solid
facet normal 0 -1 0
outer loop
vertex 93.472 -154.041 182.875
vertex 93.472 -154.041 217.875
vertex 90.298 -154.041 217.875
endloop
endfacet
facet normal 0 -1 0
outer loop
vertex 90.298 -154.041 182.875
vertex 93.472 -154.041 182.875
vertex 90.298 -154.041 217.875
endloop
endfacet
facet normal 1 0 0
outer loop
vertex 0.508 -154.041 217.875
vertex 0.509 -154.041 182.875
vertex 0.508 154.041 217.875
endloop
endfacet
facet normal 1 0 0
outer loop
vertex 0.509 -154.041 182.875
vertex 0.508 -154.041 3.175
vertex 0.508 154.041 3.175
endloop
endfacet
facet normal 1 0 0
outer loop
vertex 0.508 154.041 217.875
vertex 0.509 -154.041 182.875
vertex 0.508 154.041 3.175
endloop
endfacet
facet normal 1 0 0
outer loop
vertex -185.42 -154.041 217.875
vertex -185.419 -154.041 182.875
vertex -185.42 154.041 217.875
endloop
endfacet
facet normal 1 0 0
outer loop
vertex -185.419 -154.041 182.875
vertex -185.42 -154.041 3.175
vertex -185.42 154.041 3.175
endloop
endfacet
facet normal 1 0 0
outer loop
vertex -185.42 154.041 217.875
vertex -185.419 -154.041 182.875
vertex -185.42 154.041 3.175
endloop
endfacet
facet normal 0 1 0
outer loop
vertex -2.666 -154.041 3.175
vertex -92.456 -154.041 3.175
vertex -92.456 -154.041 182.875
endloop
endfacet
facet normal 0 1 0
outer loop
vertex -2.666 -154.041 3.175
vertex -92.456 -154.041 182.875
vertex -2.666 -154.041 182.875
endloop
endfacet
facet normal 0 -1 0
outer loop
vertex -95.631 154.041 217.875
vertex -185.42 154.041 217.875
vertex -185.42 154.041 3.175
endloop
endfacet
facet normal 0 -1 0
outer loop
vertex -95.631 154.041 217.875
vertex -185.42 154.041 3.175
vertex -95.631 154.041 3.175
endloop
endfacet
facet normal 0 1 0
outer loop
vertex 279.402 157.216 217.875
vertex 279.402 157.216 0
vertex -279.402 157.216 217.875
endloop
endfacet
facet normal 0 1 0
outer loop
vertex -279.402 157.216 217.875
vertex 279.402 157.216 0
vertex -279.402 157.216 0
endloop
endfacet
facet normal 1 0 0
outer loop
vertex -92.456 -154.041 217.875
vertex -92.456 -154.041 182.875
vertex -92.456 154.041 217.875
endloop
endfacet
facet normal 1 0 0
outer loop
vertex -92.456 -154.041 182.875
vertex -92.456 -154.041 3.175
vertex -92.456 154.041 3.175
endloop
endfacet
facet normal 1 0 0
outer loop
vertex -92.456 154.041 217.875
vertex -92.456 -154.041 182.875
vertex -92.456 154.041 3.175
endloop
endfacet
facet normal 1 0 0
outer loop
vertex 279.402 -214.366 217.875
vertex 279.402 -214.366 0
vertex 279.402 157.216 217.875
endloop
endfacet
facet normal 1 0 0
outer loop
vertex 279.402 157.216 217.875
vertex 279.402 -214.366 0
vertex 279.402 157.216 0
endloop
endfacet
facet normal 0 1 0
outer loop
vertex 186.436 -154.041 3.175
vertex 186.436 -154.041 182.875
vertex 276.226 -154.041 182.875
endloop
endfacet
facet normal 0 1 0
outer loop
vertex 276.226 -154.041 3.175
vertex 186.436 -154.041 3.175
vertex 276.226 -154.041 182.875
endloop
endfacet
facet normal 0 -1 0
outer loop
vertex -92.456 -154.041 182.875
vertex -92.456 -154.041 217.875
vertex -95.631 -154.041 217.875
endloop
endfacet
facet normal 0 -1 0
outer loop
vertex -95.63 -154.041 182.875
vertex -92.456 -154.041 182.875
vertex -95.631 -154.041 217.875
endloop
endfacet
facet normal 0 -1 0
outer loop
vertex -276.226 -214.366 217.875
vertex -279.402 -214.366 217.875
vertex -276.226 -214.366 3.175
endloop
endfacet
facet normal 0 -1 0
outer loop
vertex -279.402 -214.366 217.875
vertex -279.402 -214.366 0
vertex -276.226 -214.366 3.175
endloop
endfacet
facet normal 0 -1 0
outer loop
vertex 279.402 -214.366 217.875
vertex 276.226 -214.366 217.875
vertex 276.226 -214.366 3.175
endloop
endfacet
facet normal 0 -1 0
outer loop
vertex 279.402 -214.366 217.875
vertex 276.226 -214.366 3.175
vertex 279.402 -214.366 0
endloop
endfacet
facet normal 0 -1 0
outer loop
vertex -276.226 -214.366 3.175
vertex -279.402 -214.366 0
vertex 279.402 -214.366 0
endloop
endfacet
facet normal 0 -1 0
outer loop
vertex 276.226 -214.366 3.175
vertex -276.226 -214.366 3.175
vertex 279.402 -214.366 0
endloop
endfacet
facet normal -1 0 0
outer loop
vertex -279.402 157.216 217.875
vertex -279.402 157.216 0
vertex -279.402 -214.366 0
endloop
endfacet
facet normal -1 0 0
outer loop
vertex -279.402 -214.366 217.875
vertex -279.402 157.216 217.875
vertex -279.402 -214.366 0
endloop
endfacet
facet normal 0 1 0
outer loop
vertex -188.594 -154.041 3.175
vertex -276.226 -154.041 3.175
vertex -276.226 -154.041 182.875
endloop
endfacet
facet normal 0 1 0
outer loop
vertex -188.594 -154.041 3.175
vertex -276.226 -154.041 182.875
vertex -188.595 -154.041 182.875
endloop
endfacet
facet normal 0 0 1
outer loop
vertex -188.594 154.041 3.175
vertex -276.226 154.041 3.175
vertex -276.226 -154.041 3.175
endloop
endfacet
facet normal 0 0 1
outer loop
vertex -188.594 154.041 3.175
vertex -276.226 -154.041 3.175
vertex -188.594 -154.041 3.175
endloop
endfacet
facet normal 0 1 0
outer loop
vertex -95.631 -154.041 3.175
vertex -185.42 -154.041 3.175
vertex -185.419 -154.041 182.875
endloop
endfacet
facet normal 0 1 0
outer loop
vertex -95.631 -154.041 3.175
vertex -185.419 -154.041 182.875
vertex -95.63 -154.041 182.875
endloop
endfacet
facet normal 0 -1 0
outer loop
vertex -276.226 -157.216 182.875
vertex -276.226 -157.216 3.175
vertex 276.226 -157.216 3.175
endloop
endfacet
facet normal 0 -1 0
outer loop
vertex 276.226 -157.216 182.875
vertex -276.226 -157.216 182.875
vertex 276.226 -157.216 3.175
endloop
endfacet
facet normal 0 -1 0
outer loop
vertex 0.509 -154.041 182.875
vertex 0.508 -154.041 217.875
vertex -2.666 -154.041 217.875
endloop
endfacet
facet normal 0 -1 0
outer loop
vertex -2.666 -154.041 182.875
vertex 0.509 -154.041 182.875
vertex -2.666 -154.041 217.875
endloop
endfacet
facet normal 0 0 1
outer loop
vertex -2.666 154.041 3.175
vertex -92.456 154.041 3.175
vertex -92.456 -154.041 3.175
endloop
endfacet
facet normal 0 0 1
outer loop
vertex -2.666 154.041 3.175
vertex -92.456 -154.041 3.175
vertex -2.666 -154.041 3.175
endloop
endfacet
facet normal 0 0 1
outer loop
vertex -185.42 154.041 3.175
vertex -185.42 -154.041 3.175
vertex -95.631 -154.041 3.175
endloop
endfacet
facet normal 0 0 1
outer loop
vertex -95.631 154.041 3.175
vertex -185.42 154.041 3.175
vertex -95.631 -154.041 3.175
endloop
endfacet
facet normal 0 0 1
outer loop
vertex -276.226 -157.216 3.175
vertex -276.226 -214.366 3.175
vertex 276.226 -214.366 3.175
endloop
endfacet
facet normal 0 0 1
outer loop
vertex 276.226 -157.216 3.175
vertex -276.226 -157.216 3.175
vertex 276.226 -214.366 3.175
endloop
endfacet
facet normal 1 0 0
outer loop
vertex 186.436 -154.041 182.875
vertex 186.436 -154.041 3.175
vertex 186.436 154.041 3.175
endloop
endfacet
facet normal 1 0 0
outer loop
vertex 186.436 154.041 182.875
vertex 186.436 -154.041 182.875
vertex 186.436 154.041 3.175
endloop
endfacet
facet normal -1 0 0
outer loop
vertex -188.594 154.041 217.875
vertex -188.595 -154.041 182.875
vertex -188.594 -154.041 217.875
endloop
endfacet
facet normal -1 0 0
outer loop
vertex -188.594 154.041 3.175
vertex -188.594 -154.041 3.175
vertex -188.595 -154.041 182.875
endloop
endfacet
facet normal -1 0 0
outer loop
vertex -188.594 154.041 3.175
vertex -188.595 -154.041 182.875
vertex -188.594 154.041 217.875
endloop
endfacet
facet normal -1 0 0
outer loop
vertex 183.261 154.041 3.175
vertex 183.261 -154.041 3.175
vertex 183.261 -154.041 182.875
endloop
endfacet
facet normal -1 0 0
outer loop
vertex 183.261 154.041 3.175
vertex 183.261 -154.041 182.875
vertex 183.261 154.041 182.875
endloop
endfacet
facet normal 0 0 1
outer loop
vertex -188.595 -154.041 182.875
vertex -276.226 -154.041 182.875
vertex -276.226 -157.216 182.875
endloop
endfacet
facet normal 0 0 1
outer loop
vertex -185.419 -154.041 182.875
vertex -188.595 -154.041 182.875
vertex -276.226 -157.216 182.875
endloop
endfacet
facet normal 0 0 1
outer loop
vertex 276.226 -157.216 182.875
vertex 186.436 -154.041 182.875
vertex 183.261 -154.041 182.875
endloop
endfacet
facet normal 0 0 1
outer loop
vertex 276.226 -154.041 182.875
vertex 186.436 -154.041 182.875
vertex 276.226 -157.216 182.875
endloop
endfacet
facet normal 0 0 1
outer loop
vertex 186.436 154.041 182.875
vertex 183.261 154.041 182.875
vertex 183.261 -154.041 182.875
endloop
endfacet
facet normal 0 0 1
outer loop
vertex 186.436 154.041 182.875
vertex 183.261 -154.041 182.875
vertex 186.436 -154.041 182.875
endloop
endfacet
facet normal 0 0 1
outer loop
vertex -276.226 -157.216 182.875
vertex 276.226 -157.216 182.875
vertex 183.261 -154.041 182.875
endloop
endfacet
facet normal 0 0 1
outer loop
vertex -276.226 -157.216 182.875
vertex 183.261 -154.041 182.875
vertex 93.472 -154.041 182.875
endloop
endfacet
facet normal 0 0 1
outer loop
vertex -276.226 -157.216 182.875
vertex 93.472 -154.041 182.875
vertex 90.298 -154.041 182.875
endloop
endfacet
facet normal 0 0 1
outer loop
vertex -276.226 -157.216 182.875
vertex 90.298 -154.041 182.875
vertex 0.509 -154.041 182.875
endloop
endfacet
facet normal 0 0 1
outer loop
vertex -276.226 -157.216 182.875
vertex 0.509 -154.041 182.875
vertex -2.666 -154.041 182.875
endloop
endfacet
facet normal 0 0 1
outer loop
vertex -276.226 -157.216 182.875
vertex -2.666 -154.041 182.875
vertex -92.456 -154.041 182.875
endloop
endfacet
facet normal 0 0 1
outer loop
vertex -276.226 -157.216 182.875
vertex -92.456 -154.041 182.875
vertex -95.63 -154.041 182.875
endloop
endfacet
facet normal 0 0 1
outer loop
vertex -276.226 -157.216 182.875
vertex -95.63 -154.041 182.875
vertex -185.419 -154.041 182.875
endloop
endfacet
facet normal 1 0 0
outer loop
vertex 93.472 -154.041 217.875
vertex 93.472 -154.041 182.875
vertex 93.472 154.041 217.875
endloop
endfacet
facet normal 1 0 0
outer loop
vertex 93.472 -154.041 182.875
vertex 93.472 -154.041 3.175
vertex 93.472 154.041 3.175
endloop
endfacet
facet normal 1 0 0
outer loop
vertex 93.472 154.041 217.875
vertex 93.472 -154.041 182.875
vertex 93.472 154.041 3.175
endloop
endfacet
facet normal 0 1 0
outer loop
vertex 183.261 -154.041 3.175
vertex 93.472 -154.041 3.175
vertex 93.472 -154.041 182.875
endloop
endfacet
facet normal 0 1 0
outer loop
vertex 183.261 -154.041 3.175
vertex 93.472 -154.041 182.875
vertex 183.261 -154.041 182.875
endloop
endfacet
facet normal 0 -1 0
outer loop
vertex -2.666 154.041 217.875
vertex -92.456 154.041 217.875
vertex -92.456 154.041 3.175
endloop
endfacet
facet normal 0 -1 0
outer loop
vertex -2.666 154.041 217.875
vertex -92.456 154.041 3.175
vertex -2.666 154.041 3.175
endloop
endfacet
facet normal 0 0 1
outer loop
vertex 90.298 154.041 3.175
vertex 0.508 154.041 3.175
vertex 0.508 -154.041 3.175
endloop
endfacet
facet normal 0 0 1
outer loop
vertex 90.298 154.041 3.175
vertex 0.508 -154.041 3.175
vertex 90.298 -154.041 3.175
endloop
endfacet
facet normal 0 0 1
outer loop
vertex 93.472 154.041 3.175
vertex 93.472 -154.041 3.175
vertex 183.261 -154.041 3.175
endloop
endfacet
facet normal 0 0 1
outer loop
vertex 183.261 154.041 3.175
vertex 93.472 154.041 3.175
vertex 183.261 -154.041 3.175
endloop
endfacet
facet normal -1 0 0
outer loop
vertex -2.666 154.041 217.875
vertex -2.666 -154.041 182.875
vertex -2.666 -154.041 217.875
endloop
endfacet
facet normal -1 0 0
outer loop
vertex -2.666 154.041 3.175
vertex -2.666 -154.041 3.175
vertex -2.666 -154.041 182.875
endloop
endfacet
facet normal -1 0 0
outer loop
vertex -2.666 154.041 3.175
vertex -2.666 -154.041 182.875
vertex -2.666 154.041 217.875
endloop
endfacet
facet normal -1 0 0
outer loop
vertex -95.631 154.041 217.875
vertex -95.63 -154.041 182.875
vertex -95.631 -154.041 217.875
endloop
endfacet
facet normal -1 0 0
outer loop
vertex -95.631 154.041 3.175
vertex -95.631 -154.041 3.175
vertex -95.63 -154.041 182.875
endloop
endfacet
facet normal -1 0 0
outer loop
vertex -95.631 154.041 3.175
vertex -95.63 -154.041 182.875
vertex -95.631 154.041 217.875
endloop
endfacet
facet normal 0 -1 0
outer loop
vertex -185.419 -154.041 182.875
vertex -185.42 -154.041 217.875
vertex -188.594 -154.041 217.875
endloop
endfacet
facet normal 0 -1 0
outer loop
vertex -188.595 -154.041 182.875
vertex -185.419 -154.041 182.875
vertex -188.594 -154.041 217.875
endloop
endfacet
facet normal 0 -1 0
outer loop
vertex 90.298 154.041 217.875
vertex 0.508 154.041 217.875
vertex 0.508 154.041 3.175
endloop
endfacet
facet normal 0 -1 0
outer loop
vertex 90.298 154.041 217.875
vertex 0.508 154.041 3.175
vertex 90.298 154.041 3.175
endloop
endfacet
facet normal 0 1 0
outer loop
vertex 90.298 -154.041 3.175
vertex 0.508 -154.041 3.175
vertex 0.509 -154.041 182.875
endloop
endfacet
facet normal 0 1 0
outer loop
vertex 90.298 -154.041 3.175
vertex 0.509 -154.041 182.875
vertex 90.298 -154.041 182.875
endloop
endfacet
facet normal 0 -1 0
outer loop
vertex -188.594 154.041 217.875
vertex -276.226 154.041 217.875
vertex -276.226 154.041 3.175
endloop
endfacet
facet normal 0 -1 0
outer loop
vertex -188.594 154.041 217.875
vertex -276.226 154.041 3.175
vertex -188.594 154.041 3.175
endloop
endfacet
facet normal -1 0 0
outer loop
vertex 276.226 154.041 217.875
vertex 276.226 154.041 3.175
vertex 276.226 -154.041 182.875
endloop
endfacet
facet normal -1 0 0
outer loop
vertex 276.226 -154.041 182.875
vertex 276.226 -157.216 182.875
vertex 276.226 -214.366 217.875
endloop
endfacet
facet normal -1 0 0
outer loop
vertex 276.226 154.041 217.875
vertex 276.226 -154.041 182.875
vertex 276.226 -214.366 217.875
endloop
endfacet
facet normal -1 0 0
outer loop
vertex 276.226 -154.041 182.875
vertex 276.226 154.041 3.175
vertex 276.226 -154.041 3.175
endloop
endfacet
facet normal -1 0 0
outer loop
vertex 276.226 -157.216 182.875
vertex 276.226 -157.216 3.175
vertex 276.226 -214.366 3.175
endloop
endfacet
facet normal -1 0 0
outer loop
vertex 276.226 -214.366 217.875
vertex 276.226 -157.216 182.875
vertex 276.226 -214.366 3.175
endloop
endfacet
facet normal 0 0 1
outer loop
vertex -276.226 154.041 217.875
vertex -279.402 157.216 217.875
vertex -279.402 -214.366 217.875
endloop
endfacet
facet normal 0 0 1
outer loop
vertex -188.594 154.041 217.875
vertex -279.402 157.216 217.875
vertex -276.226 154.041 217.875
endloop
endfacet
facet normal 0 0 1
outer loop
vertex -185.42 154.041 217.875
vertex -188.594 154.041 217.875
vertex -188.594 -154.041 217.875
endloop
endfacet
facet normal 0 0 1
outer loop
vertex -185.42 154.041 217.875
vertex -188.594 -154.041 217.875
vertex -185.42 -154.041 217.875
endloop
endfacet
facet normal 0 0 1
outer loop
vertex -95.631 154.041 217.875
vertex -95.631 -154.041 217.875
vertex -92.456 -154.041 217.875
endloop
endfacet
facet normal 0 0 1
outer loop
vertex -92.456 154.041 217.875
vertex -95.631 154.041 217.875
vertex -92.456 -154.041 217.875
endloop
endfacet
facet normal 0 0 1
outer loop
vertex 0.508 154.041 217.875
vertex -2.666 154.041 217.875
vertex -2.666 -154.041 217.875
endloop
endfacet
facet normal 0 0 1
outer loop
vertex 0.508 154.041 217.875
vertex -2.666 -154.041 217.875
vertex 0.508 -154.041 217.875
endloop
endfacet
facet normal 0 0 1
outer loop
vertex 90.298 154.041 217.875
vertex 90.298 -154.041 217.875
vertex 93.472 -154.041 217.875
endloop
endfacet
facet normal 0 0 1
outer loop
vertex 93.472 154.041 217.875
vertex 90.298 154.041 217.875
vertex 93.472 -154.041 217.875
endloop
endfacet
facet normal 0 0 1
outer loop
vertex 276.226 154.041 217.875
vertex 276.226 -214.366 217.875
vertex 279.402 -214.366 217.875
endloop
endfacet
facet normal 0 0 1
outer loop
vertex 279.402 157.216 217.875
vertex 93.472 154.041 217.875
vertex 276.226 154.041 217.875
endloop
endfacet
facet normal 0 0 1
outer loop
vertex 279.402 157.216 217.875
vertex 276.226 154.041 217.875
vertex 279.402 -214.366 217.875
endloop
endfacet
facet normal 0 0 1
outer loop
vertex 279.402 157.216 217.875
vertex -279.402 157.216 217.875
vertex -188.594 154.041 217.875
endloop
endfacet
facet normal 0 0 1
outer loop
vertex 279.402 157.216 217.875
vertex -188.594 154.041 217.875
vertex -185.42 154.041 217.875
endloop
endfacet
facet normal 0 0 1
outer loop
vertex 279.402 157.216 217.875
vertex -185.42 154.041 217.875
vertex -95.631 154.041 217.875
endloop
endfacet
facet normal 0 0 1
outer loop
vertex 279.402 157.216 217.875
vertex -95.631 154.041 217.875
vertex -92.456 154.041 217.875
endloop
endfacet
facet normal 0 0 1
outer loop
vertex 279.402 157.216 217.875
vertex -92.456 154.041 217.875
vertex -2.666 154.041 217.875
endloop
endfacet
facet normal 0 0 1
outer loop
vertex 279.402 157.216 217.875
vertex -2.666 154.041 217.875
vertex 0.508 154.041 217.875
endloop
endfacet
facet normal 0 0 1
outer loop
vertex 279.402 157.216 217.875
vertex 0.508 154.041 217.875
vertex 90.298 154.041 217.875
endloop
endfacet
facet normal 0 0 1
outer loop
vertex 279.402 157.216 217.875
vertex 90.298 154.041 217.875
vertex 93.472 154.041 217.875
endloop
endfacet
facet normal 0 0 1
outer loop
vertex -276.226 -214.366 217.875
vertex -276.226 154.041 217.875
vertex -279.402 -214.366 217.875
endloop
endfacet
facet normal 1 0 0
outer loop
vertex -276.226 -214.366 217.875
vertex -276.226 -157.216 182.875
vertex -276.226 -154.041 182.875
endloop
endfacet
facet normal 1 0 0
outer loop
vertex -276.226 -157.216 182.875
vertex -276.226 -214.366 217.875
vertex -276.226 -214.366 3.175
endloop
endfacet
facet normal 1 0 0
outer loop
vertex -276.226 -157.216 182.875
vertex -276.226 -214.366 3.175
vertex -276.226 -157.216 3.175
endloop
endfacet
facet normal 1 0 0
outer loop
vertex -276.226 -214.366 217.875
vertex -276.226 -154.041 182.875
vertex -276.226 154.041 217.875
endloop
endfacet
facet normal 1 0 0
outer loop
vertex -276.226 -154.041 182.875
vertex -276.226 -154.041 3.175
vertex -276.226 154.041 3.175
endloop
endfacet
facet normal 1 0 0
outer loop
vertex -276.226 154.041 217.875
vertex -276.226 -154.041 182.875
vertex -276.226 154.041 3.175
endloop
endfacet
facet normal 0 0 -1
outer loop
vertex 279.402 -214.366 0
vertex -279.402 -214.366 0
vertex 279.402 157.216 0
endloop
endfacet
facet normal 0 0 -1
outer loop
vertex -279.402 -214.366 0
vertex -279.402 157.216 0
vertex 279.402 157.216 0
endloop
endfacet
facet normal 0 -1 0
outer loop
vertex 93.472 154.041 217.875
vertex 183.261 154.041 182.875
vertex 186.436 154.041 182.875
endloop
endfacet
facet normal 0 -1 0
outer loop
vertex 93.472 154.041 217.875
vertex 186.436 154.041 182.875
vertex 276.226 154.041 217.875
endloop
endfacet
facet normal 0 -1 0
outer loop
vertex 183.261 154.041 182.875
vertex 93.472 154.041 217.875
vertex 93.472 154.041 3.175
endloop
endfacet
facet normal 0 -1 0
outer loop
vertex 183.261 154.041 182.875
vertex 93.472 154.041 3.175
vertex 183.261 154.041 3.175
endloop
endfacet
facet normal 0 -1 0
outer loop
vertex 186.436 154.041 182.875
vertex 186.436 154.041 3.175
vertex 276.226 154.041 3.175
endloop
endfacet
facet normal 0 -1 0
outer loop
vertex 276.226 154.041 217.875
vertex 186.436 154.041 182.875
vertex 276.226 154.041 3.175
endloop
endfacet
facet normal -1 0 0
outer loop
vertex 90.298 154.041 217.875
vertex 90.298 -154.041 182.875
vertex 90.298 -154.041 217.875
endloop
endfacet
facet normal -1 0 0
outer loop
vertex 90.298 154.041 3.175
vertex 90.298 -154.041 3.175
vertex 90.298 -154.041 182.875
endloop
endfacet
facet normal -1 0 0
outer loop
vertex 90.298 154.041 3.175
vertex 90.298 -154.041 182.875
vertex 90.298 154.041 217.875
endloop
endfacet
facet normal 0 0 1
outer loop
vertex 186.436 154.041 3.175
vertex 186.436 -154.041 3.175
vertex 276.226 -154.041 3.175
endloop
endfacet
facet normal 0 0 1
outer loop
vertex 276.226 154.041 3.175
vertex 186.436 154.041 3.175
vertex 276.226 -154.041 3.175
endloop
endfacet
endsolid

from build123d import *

# Parameters (mm, degrees)
SKETCH1_W           = 558.803
SKETCH1_H           = 314.432
SKETCH1_W_2         = 552.453
SKETCH1_H_2         = 308.082
SKETCH1_W_3         = 3.175
SKETCH1_W_4         = 89.789
SKETCH1_W_5         = 87.632
SKETCH1_W_6         = 89.79
SKETCH1_H_3         = 57.15
BOSS_EXTRUDE1_DEPTH = 3.175
SKETCH2_W           = 558.803
SKETCH2_H           = 371.582
SKETCH2_W_2         = 89.79
SKETCH2_H_2         = 308.082
SKETCH2_W_3         = 89.789
SKETCH2_W_4         = 552.453
SKETCH2_H_3         = 53.975
SKETCH2_W_5         = 87.632
BOSS_EXTRUDE2_DEPTH = 176.6
SKETCH4_W           = 552.453
SKETCH4_H           = 176.6
CUT_EXTRUDE1_DEPTH  = 3.175
SKETCH5_W           = 87.632
SKETCH5_H           = 308.082
SKETCH5_W_2         = 89.789
SKETCH5_W_3         = 89.79
BOSS_EXTRUDE5_DEPTH = 38.1
SKETCH7_W           = 3.175
SKETCH7_H           = 308.082
CUT_EXTRUDE2_DEPTH  = 35


with BuildPart() as part:
    # Sketch1 → Boss-Extrude1 (new body)
    # profile 1 of 13: a face of its own
    with BuildSketch(Plane.XY):
        Rectangle(SKETCH1_W, SKETCH1_H)
        Rectangle(SKETCH1_W_2, SKETCH1_H_2, mode=Mode.SUBTRACT)
    # profile 2 of 13: a face of its own
    with BuildSketch(Plane.XY):
        with Locations((-187.007, 0)):
            Rectangle(SKETCH1_W_3, SKETCH1_H_2)
    # profile 3 of 13: a face of its own
    with BuildSketch(Plane.XY):
        with Locations((-140.525, 0)):
            Rectangle(SKETCH1_W_4, SKETCH1_H_2)
    # profile 4 of 13: a face of its own
    with BuildSketch(Plane.XY):
        with Locations((-232.4105, 0)):
            Rectangle(SKETCH1_W_5, SKETCH1_H_2)
    # profile 5 of 13: a face of its own
    with BuildSketch(Plane.XY):
        with Locations((-47.561, 0)):
            Rectangle(SKETCH1_W_4, SKETCH1_H_2)
    # profile 6 of 13: a face of its own
    with BuildSketch(Plane.XY):
        with Locations((-94.043, 0)):
            Rectangle(SKETCH1_W_3, SKETCH1_H_2)
    # profile 7 of 13: a face of its own
    with BuildSketch(Plane.XY):
        with Locations((45.403, 0)):
            Rectangle(SKETCH1_W_4, SKETCH1_H_2)
    # profile 8 of 13: a face of its own
    with BuildSketch(Plane.XY):
        with Locations((-1.079, 0)):
            Rectangle(SKETCH1_W_3, SKETCH1_H_2)
    # profile 9 of 13: a face of its own
    with BuildSketch(Plane.XY):
        with Locations((138.367, 0)):
            Rectangle(SKETCH1_W_4, SKETCH1_H_2)
    # profile 10 of 13: a face of its own
    with BuildSketch(Plane.XY):
        with Locations((91.885, 0)):
            Rectangle(SKETCH1_W_3, SKETCH1_H_2)
    # profile 11 of 13: a face of its own
    with BuildSketch(Plane.XY):
        with Locations((231.3315, 0)):
            Rectangle(SKETCH1_W_6, SKETCH1_H_2)
    # profile 12 of 13: a face of its own
    with BuildSketch(Plane.XY):
        with Locations((184.849, 0)):
            Rectangle(SKETCH1_W_3, SKETCH1_H_2)
    # profile 13 of 13: a face of its own
    with BuildSketch(Plane.XY):
        with Locations((0, -185.791)):
            Rectangle(SKETCH1_W, SKETCH1_H_3)
    extrude(amount=BOSS_EXTRUDE1_DEPTH)

    # Sketch2 → Boss-Extrude2 (add)
    with BuildSketch(Plane.XY.offset(3.175)):
        with Locations((0, -28.575)):
            Rectangle(SKETCH2_W, SKETCH2_H)
        with Locations((231.3315, 0)):
            Rectangle(SKETCH2_W_2, SKETCH2_H_2, mode=Mode.SUBTRACT)
        with Locations((138.367, 0)):
            Rectangle(SKETCH2_W_3, SKETCH2_H_2, mode=Mode.SUBTRACT)
        with Locations((0, -184.2035)):
            Rectangle(SKETCH2_W_4, SKETCH2_H_3, mode=Mode.SUBTRACT)
        with Locations((45.403, 0)):
            Rectangle(SKETCH2_W_3, SKETCH2_H_2, mode=Mode.SUBTRACT)
        with Locations((-47.561, 0)):
            Rectangle(SKETCH2_W_3, SKETCH2_H_2, mode=Mode.SUBTRACT)
        with Locations((-140.525, 0)):
            Rectangle(SKETCH2_W_3, SKETCH2_H_2, mode=Mode.SUBTRACT)
        with Locations((-232.4105, 0)):
            Rectangle(SKETCH2_W_5, SKETCH2_H_2, mode=Mode.SUBTRACT)
    extrude(amount=BOSS_EXTRUDE2_DEPTH)

    # Sketch4 → Cut-Extrude1 (cut)
    with BuildSketch(Plane.XZ.offset(214.366)):
        with Locations((0, 91.475)):
            Rectangle(SKETCH4_W, SKETCH4_H)
    extrude(amount=-CUT_EXTRUDE1_DEPTH, mode=Mode.SUBTRACT)

    # Sketch5 → Boss-Extrude5 (add)
    with BuildSketch(Plane.XY.offset(179.775)):
        Polygon((-279.4015, 157.216), (-279.4015, -214.366), (-276.2265, -214.366), (-276.2265, -157.216), (276.2265, -157.216), (276.2265, -214.366), (279.4015, -214.366), (279.4015, 157.216), align=None)
        with Locations((-232.4105, 0)):
            Rectangle(SKETCH5_W, SKETCH5_H, mode=Mode.SUBTRACT)
        with Locations((-140.525, 0)):
            Rectangle(SKETCH5_W_2, SKETCH5_H, mode=Mode.SUBTRACT)
        with Locations((-47.561, 0)):
            Rectangle(SKETCH5_W_2, SKETCH5_H, mode=Mode.SUBTRACT)
        with Locations((45.403, 0)):
            Rectangle(SKETCH5_W_2, SKETCH5_H, mode=Mode.SUBTRACT)
        with Locations((138.367, 0)):
            Rectangle(SKETCH5_W_2, SKETCH5_H, mode=Mode.SUBTRACT)
        with Locations((231.3315, 0)):
            Rectangle(SKETCH5_W_3, SKETCH5_H, mode=Mode.SUBTRACT)
    extrude(amount=BOSS_EXTRUDE5_DEPTH)

    # Sketch7 → Cut-Extrude2 (cut)
    with BuildSketch(Plane.XY.offset(217.875)):
        Polygon((-185.4195, -154.041), (-188.5945, -154.041), (-276.2265, -154.041), (-276.2265, -157.216), (276.2265, -157.216), (276.2265, -154.041), (186.4365, -154.041), (183.2615, -154.041), (93.4725, -154.041), (90.2975, -154.041), (0.5085, -154.041), (-2.6665, -154.041), (-92.4555, -154.041), (-95.6305, -154.041), align=None)
        with Locations((184.849, 0)):
            Rectangle(SKETCH7_W, SKETCH7_H)
    extrude(amount=-CUT_EXTRUDE2_DEPTH, mode=Mode.SUBTRACT)


solid = part.part
